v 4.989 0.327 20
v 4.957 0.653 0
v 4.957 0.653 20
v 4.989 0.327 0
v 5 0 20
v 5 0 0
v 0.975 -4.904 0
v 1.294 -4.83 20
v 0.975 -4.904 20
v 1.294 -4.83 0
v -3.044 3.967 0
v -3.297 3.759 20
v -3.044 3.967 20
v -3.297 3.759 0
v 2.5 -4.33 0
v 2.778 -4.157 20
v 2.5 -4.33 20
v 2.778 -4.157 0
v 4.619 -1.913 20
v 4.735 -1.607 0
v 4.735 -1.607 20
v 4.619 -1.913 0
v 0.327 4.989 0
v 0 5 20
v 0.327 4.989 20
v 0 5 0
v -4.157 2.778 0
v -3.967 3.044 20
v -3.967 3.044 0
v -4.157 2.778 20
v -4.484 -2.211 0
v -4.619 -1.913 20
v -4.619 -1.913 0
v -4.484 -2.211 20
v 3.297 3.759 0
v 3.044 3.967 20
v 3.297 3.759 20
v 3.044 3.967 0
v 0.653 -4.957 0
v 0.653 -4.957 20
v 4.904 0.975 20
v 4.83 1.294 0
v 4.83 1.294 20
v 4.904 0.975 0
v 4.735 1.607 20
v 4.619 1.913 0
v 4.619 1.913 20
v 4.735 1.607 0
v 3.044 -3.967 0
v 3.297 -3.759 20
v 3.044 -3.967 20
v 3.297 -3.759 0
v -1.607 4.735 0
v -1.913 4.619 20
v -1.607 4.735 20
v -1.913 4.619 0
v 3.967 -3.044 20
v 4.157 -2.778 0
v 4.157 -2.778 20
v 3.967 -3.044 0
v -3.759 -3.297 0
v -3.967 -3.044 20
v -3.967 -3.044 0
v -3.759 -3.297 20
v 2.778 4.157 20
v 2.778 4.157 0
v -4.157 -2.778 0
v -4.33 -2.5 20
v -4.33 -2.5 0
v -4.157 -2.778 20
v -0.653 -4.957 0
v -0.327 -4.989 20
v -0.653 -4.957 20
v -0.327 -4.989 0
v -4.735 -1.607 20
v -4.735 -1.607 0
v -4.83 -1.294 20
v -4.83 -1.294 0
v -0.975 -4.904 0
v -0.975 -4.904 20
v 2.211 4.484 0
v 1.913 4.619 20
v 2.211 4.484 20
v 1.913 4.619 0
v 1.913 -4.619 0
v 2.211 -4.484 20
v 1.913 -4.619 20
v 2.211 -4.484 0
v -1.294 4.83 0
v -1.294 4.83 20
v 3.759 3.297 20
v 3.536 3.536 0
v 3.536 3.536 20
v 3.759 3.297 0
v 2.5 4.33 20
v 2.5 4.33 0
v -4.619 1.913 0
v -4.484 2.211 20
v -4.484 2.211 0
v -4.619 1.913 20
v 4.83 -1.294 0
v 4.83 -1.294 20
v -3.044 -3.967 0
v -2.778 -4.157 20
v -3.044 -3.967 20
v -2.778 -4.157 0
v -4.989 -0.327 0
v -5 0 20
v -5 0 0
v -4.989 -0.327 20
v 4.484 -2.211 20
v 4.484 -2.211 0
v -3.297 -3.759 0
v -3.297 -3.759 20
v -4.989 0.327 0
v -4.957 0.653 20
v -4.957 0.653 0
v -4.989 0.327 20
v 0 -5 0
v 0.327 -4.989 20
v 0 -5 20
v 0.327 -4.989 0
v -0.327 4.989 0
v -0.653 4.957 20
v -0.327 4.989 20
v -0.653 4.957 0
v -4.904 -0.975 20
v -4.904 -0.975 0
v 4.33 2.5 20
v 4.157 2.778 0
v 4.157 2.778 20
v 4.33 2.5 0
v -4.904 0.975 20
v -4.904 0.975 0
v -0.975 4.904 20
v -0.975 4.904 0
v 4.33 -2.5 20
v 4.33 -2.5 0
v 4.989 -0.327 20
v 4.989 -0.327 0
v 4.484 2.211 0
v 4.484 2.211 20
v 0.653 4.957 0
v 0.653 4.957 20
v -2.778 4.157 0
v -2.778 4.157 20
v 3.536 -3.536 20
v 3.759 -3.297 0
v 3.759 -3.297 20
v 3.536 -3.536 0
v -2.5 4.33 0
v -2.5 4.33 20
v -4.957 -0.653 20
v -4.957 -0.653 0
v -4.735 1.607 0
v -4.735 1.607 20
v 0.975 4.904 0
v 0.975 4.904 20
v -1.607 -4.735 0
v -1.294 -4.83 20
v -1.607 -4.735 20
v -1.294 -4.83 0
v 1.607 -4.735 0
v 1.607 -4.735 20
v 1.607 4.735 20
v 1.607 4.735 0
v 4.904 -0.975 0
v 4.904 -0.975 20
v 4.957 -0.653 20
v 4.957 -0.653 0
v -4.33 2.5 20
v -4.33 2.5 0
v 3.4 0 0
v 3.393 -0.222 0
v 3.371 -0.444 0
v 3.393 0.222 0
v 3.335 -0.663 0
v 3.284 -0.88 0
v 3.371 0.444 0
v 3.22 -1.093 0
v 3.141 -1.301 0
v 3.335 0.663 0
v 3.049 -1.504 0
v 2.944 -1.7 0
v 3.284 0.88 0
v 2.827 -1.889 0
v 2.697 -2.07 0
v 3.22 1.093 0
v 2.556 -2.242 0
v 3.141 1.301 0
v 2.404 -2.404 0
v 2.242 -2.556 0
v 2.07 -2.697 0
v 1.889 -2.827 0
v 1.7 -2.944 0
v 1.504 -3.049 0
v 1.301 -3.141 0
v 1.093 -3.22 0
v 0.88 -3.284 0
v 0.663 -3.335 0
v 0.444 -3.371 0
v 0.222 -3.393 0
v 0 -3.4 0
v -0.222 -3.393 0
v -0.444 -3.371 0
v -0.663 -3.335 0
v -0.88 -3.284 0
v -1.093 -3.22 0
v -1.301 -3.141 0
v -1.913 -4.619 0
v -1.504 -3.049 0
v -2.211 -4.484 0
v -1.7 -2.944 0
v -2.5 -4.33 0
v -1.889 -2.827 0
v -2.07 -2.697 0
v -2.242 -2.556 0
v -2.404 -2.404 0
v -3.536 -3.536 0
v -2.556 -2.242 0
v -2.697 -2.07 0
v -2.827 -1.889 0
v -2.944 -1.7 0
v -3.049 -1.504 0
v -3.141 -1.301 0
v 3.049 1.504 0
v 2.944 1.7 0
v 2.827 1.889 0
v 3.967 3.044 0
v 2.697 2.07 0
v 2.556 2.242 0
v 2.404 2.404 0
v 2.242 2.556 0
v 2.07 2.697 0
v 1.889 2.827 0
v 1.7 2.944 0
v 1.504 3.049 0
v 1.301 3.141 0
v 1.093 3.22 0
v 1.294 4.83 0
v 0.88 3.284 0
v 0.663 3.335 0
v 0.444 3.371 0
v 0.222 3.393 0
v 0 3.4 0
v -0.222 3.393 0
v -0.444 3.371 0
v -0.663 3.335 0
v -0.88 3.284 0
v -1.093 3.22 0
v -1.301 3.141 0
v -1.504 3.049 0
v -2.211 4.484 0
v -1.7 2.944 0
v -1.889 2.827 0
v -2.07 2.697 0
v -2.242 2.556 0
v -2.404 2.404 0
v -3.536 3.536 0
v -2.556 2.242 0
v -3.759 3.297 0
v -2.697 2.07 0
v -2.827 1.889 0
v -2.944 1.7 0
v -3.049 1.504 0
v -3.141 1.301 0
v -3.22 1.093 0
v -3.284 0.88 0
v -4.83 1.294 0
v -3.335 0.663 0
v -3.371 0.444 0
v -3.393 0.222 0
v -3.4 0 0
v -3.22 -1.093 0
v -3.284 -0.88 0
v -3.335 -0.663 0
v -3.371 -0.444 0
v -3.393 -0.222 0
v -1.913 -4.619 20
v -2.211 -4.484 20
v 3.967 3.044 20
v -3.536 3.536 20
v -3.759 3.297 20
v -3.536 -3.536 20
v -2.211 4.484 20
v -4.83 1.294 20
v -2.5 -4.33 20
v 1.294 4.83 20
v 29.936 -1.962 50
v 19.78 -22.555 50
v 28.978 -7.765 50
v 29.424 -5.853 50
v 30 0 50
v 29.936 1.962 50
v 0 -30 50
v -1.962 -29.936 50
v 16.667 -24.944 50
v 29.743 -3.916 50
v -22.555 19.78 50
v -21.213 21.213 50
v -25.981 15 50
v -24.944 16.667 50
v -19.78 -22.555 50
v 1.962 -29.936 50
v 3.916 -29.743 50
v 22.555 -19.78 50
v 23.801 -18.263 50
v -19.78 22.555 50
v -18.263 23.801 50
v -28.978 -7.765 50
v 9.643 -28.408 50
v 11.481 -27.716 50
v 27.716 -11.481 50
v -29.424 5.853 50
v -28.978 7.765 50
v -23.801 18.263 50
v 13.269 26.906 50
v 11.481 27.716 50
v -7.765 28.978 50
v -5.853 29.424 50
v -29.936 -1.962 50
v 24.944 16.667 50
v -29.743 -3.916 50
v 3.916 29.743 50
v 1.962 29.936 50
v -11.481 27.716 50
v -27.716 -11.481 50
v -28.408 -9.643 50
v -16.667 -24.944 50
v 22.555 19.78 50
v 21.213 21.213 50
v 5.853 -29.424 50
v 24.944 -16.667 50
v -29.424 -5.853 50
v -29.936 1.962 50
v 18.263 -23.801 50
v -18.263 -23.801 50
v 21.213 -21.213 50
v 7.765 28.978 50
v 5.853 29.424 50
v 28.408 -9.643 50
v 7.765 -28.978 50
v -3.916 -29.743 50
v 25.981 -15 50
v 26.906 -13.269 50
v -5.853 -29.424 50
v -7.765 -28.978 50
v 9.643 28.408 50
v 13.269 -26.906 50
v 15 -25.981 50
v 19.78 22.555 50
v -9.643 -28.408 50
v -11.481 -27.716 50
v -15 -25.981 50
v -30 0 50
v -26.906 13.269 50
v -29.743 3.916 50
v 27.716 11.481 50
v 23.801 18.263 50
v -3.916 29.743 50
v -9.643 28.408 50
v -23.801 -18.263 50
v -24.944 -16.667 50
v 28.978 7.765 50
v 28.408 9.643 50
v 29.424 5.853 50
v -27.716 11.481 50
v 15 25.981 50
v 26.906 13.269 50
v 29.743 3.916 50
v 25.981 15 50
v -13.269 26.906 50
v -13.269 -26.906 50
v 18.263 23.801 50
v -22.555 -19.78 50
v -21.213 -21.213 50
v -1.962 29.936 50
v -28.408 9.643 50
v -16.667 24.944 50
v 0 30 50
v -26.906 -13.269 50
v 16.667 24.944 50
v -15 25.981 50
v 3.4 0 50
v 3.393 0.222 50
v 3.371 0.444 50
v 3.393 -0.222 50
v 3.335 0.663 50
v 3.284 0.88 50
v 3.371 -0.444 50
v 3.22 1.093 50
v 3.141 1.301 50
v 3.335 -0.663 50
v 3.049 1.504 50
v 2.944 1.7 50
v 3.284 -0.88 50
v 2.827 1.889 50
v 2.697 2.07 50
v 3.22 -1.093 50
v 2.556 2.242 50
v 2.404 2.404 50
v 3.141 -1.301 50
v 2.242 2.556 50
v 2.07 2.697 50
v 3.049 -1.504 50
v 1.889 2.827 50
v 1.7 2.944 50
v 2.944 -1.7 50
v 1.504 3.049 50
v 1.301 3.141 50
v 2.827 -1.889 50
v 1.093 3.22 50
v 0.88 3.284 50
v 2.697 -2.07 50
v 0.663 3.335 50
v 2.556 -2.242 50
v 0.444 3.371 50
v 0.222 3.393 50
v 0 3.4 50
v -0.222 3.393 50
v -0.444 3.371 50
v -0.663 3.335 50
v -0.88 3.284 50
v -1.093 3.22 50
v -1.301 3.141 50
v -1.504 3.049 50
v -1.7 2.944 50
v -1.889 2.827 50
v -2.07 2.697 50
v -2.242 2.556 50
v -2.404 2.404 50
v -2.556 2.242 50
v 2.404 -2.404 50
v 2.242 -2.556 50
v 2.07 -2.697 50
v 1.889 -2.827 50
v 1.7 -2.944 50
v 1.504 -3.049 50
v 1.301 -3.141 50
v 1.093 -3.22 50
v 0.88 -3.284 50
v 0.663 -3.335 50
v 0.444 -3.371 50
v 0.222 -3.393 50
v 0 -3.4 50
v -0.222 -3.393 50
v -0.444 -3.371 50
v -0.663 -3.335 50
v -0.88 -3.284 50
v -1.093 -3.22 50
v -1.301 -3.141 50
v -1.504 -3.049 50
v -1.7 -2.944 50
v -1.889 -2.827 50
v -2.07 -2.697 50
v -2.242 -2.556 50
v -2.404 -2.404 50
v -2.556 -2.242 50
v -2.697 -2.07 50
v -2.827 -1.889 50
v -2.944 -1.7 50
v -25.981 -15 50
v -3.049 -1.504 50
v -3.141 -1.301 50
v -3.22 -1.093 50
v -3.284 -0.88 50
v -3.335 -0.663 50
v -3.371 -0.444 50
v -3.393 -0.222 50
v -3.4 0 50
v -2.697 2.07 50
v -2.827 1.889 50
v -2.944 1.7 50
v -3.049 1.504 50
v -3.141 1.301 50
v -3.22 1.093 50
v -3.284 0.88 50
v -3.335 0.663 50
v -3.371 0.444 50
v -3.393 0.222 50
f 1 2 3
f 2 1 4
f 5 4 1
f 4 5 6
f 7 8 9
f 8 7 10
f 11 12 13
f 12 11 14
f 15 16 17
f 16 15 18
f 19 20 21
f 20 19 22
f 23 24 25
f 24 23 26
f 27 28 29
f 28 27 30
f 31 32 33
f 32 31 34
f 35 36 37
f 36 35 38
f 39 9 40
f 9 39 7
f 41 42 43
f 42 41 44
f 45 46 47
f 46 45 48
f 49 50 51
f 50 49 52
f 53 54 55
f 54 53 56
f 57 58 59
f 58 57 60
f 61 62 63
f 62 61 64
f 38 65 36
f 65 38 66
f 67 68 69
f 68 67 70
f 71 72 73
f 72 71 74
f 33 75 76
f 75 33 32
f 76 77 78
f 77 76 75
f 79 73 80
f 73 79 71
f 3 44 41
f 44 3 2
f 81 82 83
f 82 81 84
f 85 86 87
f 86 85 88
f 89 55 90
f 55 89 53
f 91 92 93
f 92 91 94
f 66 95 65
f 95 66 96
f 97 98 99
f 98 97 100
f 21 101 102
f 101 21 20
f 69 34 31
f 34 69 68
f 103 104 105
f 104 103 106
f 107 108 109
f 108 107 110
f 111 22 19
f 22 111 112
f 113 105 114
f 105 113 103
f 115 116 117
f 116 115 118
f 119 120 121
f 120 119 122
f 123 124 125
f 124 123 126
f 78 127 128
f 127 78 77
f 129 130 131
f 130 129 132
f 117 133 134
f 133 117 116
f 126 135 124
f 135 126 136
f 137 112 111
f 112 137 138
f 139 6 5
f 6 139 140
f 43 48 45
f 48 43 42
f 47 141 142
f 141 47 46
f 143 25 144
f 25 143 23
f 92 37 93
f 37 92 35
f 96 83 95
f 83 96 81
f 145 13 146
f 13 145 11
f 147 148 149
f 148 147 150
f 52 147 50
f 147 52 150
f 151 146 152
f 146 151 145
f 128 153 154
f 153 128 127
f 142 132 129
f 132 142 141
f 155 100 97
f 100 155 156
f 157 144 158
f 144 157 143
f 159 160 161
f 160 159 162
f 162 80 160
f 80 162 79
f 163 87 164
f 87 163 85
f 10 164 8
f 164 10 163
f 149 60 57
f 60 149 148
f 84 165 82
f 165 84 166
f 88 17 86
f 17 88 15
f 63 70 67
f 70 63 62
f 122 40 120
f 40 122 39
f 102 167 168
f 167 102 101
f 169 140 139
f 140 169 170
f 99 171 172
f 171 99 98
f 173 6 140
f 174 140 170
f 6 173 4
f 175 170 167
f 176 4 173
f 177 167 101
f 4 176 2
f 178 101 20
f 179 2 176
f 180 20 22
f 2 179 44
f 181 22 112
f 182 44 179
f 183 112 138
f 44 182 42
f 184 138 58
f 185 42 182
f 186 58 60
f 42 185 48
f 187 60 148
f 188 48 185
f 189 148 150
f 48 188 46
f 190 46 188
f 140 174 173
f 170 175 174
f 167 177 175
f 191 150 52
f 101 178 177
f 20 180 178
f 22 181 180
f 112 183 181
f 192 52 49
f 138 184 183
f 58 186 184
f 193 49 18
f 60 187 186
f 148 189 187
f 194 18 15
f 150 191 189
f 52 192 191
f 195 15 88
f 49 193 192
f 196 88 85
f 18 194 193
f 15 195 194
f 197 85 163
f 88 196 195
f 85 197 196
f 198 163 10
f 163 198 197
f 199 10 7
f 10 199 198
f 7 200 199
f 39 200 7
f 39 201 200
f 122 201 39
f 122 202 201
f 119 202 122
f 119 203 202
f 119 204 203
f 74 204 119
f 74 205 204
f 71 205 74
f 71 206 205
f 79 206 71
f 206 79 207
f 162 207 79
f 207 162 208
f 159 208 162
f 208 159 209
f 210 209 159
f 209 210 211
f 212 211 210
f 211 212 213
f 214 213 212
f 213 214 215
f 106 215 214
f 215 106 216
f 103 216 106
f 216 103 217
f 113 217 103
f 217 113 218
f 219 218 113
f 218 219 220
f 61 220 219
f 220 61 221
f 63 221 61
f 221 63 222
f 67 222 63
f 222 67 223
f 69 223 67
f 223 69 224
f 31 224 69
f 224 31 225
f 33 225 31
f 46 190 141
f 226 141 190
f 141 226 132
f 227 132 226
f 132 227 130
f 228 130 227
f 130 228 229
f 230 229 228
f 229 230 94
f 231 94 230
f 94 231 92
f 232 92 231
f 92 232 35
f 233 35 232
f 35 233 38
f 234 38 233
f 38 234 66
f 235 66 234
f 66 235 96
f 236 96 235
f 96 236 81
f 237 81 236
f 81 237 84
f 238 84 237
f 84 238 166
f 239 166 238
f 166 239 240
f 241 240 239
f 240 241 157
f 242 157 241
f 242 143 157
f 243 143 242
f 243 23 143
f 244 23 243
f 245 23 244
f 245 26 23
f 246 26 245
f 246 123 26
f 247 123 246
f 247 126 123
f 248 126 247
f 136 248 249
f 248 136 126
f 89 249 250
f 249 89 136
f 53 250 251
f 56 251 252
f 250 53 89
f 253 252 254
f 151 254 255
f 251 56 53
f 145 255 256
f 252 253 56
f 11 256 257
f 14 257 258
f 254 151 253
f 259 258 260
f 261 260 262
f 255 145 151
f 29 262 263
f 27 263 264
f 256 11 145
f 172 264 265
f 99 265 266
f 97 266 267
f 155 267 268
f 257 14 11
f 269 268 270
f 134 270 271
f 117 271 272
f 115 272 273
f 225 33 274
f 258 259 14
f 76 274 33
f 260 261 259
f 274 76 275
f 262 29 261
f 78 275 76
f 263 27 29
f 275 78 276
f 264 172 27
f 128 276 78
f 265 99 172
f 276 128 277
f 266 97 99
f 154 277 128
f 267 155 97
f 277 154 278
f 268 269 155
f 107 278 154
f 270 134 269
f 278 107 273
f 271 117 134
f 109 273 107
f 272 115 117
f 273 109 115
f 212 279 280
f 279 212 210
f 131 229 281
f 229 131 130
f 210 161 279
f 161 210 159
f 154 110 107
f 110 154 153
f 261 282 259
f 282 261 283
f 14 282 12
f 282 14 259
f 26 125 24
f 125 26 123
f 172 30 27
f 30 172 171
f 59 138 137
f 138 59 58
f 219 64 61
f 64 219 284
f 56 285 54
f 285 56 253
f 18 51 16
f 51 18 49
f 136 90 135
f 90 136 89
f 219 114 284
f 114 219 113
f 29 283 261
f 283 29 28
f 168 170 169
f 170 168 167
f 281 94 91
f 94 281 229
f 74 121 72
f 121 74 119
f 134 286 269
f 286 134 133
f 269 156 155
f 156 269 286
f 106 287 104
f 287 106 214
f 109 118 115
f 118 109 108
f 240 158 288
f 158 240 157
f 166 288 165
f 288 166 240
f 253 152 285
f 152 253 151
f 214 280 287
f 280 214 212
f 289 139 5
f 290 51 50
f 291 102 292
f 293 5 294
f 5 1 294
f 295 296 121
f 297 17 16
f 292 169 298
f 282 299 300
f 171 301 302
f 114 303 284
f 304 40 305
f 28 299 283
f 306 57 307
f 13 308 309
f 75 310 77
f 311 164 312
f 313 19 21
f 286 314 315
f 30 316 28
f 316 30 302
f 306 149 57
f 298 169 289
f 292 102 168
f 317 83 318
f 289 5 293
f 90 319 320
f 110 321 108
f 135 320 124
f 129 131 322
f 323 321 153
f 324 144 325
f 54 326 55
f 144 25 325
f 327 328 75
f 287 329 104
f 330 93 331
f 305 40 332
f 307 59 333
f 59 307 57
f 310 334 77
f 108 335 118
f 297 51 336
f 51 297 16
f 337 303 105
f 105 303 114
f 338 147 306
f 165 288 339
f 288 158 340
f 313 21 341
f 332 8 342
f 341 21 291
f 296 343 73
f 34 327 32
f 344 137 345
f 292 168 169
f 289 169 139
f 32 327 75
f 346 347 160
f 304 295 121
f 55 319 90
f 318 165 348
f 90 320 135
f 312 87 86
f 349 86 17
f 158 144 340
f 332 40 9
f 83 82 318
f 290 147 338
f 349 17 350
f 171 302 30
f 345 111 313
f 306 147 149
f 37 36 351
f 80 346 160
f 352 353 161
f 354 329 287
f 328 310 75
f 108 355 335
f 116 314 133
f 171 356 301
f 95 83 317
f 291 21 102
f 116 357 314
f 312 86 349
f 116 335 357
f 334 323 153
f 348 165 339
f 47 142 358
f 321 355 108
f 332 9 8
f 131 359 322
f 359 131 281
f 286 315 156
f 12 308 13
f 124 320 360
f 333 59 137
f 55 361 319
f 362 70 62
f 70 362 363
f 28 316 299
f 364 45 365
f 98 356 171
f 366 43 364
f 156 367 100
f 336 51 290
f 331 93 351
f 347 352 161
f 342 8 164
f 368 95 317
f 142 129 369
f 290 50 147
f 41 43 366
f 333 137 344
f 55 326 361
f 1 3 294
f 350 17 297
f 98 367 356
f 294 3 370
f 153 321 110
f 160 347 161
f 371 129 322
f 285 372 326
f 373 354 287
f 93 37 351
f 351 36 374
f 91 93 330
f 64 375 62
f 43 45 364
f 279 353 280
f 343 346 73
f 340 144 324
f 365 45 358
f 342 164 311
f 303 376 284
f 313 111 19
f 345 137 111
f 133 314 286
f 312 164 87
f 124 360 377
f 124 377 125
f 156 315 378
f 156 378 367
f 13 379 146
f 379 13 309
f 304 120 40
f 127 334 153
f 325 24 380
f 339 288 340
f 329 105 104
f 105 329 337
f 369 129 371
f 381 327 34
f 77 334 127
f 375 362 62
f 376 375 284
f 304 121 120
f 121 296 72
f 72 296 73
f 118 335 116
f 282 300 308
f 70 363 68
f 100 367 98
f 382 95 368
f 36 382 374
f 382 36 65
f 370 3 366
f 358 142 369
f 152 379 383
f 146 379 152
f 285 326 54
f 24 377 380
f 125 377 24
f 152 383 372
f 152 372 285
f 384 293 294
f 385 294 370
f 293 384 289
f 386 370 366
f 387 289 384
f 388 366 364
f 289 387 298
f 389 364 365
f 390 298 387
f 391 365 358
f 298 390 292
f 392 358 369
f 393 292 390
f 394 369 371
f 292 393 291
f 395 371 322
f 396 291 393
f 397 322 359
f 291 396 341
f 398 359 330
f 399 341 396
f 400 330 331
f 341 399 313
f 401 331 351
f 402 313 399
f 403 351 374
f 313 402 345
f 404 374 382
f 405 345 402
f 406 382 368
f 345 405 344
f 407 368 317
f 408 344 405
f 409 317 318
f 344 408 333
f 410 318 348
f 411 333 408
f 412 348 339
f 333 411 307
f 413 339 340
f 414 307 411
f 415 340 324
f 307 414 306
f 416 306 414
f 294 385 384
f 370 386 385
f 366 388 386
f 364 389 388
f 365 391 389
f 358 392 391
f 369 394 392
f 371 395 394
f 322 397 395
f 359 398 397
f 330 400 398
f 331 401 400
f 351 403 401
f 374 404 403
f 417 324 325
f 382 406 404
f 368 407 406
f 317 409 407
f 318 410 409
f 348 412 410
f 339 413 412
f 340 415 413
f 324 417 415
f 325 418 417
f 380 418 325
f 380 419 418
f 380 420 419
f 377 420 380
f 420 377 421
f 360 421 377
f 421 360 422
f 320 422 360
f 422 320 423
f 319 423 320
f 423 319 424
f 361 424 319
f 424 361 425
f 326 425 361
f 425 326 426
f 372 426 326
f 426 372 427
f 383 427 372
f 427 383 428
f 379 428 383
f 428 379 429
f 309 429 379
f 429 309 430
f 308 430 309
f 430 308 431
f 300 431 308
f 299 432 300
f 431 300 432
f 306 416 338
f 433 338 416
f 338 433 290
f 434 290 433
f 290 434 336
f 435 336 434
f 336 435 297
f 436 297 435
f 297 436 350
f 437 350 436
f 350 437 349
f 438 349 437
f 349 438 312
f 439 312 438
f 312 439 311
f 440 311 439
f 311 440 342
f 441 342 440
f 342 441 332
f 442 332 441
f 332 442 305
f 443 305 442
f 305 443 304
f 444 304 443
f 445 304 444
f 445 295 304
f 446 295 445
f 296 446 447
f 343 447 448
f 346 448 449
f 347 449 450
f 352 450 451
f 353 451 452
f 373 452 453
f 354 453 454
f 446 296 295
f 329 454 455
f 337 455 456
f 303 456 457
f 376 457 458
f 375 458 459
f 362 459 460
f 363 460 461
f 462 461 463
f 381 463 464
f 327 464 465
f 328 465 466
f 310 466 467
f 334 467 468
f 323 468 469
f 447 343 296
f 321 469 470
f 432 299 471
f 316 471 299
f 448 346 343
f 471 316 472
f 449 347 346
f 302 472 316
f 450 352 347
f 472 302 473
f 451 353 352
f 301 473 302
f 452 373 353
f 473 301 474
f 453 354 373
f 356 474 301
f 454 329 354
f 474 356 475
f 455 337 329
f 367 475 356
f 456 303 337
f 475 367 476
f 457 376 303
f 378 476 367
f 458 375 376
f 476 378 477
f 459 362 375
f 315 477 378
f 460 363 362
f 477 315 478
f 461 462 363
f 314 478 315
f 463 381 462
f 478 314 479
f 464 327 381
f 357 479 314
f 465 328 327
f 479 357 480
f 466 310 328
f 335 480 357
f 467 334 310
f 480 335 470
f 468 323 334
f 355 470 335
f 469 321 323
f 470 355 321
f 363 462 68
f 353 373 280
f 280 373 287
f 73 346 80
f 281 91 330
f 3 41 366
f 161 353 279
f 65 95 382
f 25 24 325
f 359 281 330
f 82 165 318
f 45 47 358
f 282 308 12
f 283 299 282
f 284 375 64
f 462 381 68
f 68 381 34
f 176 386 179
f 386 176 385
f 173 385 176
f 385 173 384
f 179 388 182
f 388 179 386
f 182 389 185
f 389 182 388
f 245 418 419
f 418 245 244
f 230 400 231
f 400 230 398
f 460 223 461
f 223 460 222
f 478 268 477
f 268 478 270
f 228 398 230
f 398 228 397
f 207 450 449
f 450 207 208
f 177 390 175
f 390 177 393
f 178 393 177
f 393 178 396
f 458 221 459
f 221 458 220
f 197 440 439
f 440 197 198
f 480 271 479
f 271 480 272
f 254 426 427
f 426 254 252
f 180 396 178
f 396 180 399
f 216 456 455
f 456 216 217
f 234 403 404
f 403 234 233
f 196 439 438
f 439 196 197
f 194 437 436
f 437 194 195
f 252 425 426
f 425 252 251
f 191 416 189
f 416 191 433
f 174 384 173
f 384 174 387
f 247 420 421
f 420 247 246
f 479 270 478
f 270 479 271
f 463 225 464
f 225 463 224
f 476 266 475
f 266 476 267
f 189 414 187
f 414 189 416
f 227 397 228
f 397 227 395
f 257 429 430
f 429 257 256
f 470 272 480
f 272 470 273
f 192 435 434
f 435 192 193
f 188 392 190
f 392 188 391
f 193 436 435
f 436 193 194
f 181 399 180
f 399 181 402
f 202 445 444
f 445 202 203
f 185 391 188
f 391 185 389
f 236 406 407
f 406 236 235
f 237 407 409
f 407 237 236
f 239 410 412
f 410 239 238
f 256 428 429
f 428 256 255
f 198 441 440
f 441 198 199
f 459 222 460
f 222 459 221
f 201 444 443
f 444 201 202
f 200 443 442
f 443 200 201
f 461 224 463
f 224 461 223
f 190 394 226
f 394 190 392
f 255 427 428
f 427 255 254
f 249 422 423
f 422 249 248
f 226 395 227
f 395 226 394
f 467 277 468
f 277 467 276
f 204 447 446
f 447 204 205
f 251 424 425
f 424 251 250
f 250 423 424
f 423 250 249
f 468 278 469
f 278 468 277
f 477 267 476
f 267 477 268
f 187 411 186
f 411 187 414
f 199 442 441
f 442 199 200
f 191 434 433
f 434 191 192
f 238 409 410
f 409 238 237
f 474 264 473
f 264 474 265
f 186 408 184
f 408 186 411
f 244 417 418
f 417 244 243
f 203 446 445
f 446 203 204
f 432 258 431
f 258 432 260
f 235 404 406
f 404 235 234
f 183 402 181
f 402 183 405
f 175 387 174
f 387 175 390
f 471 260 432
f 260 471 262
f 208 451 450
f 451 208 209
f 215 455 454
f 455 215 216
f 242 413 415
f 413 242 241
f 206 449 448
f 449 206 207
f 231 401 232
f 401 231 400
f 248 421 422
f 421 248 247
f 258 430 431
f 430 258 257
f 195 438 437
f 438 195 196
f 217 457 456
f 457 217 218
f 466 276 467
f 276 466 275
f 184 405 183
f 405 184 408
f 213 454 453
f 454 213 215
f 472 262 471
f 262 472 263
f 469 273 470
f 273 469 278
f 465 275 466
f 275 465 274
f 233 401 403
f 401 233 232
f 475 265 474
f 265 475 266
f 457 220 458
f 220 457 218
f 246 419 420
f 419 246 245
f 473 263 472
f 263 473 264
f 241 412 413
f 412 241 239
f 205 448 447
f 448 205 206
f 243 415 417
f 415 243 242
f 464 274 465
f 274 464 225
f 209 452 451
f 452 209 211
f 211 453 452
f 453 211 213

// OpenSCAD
// Funnel - printed upright, open at top and bottom
// Units: mm

// ---- Parameters ----
spout_d        = 10;    // spout outer diameter
spout_bore     = 6.8;   // spout bore diameter (wall 1.6 mm)
spout_h        = 20;    // spout height (z = 0 to 20)
cone_top_d     = 60;    // cone rim outer diameter
cone_bottom_d  = 10;    // cone base outer diameter (at z = 20)
cone_h         = 30;    // cone height (z = 20 to 50)
wall           = 1.6;   // wall thickness everywhere
eps            = 0.5;   // cutter overshoot past faces

$fn = 96;

// ---- Model ----
difference() {
    union() {
        // Spout: cylinder from z = 0 to 20
        translate([0, 0, 0])
            cylinder(d = spout_d, h = spout_h);

        // Cone: from d = 10 at z = 20 to d = 60 at z = 50
        translate([0, 0, spout_h])
            cylinder(d1 = cone_bottom_d, d2 = cone_top_d, h = cone_h);
    }

    // Through-bore: cylinder along full height (z = 0 to 50)
    translate([0, 0, -eps])
        cylinder(d = spout_bore, h = spout_h + cone_h + 2 * eps);
}
